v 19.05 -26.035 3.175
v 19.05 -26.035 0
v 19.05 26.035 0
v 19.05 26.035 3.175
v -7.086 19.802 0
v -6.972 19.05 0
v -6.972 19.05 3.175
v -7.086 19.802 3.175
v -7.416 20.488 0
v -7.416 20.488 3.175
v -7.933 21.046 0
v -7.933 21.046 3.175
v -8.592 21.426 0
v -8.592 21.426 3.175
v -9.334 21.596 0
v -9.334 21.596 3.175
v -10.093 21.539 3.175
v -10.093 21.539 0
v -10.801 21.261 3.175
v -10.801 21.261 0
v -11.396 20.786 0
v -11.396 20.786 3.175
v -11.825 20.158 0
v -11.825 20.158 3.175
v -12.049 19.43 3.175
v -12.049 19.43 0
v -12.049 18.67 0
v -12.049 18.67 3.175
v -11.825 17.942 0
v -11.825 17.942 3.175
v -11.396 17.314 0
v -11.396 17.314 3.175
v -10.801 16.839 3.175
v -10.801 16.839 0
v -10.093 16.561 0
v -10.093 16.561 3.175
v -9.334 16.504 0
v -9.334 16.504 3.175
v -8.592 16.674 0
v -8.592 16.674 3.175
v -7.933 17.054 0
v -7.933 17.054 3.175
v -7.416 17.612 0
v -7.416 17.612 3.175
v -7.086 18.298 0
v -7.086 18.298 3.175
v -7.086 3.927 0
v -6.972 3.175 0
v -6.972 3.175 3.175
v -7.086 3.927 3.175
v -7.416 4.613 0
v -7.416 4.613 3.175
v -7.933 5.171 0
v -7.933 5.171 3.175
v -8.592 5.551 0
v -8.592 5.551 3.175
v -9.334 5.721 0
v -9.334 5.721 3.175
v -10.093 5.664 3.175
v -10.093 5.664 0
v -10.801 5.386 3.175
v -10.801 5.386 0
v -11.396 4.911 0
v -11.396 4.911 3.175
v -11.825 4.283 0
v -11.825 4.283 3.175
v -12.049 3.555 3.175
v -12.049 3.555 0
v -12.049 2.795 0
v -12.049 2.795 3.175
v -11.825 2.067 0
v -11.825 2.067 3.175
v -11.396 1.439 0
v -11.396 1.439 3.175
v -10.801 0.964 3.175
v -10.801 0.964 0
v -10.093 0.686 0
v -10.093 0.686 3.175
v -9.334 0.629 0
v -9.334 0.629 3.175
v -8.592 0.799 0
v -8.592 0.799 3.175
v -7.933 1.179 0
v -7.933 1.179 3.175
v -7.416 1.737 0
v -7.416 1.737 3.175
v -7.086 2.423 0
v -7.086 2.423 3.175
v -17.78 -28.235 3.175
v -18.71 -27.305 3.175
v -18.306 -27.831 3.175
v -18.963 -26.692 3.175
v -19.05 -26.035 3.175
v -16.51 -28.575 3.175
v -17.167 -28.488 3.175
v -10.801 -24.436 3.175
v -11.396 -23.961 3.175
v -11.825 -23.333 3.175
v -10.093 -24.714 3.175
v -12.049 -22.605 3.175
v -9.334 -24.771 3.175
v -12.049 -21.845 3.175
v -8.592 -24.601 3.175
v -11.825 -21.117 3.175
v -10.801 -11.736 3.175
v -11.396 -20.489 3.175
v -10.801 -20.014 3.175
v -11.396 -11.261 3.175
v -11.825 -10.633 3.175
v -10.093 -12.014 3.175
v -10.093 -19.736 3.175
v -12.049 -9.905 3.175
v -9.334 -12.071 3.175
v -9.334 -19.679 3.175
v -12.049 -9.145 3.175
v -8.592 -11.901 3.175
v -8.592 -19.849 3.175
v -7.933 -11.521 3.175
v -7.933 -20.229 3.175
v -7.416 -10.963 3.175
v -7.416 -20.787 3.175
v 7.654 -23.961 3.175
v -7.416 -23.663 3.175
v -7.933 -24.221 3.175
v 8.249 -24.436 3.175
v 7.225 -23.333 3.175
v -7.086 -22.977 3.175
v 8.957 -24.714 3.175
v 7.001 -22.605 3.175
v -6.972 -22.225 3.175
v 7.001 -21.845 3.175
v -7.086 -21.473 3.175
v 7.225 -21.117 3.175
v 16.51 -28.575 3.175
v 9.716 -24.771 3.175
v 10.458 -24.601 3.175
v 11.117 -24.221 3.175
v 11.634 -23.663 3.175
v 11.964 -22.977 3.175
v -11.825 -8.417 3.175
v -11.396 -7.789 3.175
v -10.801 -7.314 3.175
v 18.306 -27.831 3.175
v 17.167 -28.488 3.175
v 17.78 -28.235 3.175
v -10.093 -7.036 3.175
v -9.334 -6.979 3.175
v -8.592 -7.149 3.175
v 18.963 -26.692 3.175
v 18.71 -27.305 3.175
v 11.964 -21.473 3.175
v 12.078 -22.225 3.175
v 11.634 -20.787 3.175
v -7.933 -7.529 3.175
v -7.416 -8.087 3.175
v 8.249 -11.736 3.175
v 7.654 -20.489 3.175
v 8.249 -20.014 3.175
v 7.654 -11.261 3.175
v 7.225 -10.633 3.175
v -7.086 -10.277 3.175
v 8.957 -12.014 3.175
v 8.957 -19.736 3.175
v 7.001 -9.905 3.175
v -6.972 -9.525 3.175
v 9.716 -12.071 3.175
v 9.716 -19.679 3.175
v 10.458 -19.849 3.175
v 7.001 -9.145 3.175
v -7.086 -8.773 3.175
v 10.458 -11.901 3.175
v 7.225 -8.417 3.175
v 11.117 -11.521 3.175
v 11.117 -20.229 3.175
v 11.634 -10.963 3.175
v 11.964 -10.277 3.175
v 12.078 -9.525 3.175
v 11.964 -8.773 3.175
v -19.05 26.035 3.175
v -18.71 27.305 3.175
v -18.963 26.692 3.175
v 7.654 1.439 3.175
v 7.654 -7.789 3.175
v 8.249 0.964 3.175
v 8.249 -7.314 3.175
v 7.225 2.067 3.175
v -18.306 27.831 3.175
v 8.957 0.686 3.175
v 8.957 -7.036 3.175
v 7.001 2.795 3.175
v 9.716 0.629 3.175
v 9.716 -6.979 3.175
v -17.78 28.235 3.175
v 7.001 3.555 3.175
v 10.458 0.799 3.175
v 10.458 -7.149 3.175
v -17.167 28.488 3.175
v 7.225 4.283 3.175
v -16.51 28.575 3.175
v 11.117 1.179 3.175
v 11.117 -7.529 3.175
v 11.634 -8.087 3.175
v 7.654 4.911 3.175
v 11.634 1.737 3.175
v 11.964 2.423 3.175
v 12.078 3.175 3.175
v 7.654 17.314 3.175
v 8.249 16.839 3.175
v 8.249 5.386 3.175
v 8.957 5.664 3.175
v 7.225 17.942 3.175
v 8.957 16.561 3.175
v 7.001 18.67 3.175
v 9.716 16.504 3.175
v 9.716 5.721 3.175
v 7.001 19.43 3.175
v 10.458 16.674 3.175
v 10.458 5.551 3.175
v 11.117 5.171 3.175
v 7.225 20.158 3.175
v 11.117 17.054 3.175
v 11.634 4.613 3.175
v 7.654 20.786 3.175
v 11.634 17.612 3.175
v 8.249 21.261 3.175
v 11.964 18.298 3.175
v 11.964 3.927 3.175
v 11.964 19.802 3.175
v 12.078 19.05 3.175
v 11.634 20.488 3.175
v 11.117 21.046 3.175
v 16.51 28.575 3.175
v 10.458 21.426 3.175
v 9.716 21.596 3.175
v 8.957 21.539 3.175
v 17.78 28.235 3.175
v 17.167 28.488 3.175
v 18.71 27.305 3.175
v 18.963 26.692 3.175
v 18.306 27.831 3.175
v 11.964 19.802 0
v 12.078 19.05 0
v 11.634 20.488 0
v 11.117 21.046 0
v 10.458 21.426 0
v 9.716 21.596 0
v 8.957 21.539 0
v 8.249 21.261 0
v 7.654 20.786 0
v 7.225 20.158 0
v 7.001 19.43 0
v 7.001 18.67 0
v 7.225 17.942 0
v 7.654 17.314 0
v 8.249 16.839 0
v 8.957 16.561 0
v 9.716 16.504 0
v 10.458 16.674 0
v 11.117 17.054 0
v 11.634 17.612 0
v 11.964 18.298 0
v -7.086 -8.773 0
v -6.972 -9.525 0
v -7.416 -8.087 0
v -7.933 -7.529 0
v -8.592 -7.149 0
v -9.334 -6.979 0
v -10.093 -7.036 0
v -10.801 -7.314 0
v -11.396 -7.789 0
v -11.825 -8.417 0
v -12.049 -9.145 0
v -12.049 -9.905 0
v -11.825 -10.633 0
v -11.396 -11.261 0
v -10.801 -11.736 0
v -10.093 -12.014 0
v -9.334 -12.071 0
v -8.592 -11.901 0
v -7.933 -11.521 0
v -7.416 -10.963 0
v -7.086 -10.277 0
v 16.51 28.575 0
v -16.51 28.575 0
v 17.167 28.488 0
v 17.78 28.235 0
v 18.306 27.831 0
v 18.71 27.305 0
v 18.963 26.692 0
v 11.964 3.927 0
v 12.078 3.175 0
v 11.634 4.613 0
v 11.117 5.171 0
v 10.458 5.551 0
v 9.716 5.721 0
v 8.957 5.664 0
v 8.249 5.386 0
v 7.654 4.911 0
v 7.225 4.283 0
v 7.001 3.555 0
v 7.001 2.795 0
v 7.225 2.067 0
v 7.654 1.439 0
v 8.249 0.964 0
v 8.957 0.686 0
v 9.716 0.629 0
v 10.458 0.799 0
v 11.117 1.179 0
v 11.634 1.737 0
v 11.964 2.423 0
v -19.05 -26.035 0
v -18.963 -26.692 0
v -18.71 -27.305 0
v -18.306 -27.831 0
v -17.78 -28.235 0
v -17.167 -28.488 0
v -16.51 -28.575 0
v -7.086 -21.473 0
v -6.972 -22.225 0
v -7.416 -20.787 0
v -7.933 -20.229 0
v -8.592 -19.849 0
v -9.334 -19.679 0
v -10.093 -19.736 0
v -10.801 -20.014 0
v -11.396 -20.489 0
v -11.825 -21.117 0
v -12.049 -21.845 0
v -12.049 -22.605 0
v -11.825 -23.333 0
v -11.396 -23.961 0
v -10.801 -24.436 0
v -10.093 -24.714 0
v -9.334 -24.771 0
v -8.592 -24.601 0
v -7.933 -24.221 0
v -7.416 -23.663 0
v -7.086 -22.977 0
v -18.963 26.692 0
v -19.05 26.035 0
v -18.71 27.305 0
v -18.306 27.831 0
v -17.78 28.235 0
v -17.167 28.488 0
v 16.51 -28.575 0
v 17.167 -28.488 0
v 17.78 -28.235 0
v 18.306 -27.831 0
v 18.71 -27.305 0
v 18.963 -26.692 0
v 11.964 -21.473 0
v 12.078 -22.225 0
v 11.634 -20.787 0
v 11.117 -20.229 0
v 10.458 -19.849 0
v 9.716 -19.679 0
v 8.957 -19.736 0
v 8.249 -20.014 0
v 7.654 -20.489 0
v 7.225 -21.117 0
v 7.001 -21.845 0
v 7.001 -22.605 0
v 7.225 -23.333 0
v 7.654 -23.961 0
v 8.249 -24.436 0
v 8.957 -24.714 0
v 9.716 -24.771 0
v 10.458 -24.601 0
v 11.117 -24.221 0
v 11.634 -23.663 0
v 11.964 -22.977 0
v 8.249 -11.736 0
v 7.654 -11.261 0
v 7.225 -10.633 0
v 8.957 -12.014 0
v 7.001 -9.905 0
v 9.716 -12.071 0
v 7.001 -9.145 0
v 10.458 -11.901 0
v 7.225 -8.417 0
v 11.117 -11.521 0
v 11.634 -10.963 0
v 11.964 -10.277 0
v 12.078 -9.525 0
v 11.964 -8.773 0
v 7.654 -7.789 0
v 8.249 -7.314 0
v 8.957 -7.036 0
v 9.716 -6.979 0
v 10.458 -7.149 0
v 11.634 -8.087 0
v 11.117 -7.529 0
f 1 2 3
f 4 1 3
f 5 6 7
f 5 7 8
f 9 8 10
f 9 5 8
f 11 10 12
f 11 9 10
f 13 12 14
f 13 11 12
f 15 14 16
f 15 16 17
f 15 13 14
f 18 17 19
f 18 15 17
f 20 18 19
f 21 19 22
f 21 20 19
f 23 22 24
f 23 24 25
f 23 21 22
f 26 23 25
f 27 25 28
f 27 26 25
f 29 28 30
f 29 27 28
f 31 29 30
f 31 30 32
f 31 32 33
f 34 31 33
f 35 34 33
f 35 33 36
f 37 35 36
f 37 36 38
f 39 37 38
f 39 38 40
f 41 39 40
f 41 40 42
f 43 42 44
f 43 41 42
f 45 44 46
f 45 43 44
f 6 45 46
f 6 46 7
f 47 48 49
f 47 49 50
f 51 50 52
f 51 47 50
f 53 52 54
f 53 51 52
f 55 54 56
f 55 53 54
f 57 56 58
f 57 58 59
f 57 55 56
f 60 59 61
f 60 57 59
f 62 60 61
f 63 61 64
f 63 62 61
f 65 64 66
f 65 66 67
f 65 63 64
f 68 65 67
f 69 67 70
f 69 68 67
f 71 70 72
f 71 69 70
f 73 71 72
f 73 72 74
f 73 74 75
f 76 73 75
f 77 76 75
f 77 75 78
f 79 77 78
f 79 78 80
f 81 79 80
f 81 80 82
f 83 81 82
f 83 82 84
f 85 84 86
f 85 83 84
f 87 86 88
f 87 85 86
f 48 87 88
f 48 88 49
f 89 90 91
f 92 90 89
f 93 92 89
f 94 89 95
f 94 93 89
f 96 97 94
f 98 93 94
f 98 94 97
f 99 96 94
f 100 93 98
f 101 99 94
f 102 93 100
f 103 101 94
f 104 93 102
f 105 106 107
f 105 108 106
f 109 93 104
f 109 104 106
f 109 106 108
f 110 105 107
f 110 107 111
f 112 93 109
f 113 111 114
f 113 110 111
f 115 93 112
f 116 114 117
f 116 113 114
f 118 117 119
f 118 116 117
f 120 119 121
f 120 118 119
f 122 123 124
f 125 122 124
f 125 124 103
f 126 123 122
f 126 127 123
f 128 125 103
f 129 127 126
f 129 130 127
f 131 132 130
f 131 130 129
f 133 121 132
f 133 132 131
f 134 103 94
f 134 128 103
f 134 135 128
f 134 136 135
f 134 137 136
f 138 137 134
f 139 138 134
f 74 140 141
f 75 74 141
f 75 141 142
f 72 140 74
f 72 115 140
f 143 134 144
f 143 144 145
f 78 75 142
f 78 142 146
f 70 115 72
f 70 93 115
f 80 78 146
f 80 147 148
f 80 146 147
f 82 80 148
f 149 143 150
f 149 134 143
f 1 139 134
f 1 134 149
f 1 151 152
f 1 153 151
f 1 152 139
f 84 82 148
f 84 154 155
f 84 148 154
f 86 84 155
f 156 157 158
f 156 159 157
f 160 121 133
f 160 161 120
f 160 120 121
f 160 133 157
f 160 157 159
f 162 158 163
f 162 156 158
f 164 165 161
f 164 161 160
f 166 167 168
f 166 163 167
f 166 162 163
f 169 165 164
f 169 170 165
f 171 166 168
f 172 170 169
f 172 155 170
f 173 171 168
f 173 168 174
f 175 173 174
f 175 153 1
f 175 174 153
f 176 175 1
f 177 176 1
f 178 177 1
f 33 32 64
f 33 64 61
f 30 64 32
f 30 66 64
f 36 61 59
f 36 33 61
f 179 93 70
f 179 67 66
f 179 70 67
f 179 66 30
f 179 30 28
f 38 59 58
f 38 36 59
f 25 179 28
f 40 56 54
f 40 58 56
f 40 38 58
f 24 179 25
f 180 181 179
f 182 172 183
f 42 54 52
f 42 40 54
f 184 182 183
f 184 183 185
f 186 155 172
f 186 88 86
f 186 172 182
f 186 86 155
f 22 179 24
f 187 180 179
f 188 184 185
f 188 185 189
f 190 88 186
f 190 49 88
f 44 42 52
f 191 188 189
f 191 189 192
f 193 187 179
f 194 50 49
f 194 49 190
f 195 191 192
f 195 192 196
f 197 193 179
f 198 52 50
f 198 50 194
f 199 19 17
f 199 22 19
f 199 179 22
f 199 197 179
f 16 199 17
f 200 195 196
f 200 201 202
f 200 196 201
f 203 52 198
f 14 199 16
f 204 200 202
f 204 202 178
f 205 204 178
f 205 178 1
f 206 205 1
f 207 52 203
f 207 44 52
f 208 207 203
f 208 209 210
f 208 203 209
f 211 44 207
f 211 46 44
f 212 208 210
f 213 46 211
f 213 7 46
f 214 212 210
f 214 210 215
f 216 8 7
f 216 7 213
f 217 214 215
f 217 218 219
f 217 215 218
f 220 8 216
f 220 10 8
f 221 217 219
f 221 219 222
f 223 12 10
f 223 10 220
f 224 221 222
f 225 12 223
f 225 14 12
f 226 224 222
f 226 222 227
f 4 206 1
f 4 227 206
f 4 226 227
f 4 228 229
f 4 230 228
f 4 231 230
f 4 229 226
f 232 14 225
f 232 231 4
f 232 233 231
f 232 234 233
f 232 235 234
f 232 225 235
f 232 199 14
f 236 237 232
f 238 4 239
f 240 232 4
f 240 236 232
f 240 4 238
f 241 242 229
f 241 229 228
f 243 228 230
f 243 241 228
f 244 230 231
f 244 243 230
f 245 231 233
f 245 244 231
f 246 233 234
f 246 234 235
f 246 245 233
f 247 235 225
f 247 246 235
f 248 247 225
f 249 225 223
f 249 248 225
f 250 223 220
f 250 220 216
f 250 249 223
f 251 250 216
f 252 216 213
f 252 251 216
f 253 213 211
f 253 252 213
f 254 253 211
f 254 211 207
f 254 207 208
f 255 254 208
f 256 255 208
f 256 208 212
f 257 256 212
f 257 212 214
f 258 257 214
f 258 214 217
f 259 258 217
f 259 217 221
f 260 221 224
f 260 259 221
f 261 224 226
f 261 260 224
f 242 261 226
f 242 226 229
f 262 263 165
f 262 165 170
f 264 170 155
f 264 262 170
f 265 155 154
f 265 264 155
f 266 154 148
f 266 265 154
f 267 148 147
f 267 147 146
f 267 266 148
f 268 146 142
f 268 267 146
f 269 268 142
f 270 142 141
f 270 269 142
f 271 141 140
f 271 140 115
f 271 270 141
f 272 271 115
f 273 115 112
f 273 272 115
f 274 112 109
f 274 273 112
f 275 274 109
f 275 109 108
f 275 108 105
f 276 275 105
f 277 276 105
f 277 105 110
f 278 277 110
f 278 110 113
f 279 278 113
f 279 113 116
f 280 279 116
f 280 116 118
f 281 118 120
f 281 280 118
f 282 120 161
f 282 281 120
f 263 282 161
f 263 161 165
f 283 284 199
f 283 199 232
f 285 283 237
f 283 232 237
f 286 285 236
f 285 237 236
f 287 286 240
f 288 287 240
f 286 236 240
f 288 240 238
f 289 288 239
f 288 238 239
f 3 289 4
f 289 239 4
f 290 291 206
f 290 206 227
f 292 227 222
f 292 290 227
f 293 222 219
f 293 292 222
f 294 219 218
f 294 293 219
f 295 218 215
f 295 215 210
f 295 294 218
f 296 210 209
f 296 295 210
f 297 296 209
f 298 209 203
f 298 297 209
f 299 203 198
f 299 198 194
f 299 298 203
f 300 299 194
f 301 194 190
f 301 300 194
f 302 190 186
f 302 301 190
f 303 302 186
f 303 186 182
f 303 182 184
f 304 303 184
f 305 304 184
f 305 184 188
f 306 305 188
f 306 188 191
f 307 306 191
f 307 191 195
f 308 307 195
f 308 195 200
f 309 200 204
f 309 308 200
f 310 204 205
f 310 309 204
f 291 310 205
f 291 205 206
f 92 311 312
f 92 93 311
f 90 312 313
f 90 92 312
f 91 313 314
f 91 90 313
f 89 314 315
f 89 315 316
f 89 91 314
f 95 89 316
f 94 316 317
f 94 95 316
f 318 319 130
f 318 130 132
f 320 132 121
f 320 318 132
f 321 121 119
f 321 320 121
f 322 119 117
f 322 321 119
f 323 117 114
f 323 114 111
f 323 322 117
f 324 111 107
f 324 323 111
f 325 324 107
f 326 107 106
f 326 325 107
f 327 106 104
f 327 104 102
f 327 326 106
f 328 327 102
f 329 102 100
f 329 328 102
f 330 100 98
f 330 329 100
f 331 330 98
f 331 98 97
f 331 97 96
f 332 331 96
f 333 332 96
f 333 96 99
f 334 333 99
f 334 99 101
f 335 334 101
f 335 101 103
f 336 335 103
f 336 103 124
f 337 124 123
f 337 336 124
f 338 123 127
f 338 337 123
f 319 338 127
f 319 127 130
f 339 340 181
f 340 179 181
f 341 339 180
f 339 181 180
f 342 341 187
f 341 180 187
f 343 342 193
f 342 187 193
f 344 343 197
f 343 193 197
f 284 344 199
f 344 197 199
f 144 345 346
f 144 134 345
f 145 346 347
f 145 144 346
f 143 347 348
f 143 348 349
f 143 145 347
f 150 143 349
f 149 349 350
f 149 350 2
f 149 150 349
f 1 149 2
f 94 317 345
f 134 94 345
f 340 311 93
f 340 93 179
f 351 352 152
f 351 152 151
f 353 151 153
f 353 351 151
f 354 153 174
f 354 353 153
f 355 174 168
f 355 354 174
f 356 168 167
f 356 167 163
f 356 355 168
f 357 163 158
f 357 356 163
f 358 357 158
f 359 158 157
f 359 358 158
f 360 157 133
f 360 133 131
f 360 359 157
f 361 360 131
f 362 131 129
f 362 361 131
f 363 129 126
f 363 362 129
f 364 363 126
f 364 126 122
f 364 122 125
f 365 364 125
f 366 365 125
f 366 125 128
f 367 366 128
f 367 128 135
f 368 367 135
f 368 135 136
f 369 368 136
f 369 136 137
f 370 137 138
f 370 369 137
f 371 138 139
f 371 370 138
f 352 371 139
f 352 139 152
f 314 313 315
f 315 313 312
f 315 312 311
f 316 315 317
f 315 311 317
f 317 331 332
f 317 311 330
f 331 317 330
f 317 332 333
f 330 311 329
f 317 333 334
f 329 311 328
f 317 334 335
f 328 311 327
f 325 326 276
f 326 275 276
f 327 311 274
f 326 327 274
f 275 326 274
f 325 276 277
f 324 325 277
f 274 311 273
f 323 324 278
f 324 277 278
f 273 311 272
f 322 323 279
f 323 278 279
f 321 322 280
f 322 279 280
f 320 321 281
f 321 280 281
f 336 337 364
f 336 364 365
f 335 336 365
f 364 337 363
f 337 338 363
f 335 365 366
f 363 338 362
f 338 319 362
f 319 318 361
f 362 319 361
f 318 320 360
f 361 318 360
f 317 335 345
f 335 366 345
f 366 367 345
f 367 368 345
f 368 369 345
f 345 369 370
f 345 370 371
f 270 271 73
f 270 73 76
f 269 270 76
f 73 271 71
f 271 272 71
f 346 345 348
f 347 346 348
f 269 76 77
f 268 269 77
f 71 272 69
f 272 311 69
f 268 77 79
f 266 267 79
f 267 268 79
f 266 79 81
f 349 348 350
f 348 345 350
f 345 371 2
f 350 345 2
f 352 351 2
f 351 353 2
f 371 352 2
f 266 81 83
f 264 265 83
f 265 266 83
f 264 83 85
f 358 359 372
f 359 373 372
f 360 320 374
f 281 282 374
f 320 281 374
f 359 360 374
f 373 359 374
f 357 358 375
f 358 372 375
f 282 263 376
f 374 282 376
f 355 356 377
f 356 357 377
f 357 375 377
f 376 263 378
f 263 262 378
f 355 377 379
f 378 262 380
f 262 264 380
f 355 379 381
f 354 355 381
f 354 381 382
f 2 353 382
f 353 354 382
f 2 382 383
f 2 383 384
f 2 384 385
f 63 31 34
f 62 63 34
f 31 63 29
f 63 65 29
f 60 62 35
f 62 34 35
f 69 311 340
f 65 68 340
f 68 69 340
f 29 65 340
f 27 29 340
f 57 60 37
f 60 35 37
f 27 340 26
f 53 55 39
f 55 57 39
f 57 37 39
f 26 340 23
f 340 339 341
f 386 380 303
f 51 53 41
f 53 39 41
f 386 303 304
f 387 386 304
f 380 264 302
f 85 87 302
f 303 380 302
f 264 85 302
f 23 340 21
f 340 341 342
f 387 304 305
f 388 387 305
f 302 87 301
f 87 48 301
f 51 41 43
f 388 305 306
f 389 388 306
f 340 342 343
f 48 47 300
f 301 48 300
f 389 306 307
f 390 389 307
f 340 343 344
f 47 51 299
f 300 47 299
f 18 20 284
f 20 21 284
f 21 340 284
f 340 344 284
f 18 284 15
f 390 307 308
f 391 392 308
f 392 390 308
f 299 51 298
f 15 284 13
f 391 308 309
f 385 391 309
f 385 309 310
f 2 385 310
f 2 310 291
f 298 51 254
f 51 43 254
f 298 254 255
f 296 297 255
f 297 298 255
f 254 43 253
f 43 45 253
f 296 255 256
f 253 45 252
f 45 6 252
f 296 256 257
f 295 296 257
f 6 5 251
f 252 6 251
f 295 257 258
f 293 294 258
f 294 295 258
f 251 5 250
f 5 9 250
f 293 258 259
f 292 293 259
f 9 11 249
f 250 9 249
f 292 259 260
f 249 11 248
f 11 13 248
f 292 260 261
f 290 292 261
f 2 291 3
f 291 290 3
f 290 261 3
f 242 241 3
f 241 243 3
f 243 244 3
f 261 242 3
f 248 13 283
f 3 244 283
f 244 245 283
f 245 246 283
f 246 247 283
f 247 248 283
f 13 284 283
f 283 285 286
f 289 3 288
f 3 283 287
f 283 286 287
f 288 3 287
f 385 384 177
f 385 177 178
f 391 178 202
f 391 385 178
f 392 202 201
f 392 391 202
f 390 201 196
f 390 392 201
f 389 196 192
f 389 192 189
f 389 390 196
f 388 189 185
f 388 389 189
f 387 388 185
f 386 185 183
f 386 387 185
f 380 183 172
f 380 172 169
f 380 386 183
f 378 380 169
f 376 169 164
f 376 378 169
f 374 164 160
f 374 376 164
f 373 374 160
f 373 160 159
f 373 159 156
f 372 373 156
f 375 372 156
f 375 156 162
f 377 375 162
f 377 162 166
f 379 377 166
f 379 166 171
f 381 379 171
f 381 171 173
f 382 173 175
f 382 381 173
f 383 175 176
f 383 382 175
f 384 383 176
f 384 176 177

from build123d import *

# Parameters (mm, degrees)
SKETCH1_W           = 38.1
SKETCH1_H           = 57.15
SKETCH1_R           = 2.5527
BOSS_EXTRUDE1_DEPTH = 3.175
FILLET1_R           = 2.54


with BuildPart() as part:
    # Sketch1 → Boss-Extrude1 (new body)
    with BuildSketch(Plane.XY):
        Rectangle(SKETCH1_W, SKETCH1_H)
        with Locations((-9.525, 3.175)):
            Circle(SKETCH1_R, mode=Mode.SUBTRACT)
        with Locations((-9.525, 19.05)):
            Circle(SKETCH1_R, mode=Mode.SUBTRACT)
        with Locations((9.525, 3.175)):
            Circle(SKETCH1_R, mode=Mode.SUBTRACT)
        with Locations((9.525, 19.05)):
            Circle(SKETCH1_R, mode=Mode.SUBTRACT)
        with Locations((-9.525, -9.525)):
            Circle(SKETCH1_R, mode=Mode.SUBTRACT)
        with Locations((9.525, -9.525)):
            Circle(SKETCH1_R, mode=Mode.SUBTRACT)
        with Locations((-9.525, -22.225)):
            Circle(SKETCH1_R, mode=Mode.SUBTRACT)
        with Locations((9.525, -22.225)):
            Circle(SKETCH1_R, mode=Mode.SUBTRACT)
    extrude(amount=BOSS_EXTRUDE1_DEPTH)

    # Fillet1
    fillet1_edges = [part.edges().sort_by_distance(p)[0] for p in [
        (19.05, -28.575, 1.5875),
        (-19.05, -28.575, 1.5875),
        (-19.05, 28.575, 1.5875),
        (19.05, 28.575, 1.5875),
    ]]
    fillet(fillet1_edges, radius=FILLET1_R)


solid = part.part
